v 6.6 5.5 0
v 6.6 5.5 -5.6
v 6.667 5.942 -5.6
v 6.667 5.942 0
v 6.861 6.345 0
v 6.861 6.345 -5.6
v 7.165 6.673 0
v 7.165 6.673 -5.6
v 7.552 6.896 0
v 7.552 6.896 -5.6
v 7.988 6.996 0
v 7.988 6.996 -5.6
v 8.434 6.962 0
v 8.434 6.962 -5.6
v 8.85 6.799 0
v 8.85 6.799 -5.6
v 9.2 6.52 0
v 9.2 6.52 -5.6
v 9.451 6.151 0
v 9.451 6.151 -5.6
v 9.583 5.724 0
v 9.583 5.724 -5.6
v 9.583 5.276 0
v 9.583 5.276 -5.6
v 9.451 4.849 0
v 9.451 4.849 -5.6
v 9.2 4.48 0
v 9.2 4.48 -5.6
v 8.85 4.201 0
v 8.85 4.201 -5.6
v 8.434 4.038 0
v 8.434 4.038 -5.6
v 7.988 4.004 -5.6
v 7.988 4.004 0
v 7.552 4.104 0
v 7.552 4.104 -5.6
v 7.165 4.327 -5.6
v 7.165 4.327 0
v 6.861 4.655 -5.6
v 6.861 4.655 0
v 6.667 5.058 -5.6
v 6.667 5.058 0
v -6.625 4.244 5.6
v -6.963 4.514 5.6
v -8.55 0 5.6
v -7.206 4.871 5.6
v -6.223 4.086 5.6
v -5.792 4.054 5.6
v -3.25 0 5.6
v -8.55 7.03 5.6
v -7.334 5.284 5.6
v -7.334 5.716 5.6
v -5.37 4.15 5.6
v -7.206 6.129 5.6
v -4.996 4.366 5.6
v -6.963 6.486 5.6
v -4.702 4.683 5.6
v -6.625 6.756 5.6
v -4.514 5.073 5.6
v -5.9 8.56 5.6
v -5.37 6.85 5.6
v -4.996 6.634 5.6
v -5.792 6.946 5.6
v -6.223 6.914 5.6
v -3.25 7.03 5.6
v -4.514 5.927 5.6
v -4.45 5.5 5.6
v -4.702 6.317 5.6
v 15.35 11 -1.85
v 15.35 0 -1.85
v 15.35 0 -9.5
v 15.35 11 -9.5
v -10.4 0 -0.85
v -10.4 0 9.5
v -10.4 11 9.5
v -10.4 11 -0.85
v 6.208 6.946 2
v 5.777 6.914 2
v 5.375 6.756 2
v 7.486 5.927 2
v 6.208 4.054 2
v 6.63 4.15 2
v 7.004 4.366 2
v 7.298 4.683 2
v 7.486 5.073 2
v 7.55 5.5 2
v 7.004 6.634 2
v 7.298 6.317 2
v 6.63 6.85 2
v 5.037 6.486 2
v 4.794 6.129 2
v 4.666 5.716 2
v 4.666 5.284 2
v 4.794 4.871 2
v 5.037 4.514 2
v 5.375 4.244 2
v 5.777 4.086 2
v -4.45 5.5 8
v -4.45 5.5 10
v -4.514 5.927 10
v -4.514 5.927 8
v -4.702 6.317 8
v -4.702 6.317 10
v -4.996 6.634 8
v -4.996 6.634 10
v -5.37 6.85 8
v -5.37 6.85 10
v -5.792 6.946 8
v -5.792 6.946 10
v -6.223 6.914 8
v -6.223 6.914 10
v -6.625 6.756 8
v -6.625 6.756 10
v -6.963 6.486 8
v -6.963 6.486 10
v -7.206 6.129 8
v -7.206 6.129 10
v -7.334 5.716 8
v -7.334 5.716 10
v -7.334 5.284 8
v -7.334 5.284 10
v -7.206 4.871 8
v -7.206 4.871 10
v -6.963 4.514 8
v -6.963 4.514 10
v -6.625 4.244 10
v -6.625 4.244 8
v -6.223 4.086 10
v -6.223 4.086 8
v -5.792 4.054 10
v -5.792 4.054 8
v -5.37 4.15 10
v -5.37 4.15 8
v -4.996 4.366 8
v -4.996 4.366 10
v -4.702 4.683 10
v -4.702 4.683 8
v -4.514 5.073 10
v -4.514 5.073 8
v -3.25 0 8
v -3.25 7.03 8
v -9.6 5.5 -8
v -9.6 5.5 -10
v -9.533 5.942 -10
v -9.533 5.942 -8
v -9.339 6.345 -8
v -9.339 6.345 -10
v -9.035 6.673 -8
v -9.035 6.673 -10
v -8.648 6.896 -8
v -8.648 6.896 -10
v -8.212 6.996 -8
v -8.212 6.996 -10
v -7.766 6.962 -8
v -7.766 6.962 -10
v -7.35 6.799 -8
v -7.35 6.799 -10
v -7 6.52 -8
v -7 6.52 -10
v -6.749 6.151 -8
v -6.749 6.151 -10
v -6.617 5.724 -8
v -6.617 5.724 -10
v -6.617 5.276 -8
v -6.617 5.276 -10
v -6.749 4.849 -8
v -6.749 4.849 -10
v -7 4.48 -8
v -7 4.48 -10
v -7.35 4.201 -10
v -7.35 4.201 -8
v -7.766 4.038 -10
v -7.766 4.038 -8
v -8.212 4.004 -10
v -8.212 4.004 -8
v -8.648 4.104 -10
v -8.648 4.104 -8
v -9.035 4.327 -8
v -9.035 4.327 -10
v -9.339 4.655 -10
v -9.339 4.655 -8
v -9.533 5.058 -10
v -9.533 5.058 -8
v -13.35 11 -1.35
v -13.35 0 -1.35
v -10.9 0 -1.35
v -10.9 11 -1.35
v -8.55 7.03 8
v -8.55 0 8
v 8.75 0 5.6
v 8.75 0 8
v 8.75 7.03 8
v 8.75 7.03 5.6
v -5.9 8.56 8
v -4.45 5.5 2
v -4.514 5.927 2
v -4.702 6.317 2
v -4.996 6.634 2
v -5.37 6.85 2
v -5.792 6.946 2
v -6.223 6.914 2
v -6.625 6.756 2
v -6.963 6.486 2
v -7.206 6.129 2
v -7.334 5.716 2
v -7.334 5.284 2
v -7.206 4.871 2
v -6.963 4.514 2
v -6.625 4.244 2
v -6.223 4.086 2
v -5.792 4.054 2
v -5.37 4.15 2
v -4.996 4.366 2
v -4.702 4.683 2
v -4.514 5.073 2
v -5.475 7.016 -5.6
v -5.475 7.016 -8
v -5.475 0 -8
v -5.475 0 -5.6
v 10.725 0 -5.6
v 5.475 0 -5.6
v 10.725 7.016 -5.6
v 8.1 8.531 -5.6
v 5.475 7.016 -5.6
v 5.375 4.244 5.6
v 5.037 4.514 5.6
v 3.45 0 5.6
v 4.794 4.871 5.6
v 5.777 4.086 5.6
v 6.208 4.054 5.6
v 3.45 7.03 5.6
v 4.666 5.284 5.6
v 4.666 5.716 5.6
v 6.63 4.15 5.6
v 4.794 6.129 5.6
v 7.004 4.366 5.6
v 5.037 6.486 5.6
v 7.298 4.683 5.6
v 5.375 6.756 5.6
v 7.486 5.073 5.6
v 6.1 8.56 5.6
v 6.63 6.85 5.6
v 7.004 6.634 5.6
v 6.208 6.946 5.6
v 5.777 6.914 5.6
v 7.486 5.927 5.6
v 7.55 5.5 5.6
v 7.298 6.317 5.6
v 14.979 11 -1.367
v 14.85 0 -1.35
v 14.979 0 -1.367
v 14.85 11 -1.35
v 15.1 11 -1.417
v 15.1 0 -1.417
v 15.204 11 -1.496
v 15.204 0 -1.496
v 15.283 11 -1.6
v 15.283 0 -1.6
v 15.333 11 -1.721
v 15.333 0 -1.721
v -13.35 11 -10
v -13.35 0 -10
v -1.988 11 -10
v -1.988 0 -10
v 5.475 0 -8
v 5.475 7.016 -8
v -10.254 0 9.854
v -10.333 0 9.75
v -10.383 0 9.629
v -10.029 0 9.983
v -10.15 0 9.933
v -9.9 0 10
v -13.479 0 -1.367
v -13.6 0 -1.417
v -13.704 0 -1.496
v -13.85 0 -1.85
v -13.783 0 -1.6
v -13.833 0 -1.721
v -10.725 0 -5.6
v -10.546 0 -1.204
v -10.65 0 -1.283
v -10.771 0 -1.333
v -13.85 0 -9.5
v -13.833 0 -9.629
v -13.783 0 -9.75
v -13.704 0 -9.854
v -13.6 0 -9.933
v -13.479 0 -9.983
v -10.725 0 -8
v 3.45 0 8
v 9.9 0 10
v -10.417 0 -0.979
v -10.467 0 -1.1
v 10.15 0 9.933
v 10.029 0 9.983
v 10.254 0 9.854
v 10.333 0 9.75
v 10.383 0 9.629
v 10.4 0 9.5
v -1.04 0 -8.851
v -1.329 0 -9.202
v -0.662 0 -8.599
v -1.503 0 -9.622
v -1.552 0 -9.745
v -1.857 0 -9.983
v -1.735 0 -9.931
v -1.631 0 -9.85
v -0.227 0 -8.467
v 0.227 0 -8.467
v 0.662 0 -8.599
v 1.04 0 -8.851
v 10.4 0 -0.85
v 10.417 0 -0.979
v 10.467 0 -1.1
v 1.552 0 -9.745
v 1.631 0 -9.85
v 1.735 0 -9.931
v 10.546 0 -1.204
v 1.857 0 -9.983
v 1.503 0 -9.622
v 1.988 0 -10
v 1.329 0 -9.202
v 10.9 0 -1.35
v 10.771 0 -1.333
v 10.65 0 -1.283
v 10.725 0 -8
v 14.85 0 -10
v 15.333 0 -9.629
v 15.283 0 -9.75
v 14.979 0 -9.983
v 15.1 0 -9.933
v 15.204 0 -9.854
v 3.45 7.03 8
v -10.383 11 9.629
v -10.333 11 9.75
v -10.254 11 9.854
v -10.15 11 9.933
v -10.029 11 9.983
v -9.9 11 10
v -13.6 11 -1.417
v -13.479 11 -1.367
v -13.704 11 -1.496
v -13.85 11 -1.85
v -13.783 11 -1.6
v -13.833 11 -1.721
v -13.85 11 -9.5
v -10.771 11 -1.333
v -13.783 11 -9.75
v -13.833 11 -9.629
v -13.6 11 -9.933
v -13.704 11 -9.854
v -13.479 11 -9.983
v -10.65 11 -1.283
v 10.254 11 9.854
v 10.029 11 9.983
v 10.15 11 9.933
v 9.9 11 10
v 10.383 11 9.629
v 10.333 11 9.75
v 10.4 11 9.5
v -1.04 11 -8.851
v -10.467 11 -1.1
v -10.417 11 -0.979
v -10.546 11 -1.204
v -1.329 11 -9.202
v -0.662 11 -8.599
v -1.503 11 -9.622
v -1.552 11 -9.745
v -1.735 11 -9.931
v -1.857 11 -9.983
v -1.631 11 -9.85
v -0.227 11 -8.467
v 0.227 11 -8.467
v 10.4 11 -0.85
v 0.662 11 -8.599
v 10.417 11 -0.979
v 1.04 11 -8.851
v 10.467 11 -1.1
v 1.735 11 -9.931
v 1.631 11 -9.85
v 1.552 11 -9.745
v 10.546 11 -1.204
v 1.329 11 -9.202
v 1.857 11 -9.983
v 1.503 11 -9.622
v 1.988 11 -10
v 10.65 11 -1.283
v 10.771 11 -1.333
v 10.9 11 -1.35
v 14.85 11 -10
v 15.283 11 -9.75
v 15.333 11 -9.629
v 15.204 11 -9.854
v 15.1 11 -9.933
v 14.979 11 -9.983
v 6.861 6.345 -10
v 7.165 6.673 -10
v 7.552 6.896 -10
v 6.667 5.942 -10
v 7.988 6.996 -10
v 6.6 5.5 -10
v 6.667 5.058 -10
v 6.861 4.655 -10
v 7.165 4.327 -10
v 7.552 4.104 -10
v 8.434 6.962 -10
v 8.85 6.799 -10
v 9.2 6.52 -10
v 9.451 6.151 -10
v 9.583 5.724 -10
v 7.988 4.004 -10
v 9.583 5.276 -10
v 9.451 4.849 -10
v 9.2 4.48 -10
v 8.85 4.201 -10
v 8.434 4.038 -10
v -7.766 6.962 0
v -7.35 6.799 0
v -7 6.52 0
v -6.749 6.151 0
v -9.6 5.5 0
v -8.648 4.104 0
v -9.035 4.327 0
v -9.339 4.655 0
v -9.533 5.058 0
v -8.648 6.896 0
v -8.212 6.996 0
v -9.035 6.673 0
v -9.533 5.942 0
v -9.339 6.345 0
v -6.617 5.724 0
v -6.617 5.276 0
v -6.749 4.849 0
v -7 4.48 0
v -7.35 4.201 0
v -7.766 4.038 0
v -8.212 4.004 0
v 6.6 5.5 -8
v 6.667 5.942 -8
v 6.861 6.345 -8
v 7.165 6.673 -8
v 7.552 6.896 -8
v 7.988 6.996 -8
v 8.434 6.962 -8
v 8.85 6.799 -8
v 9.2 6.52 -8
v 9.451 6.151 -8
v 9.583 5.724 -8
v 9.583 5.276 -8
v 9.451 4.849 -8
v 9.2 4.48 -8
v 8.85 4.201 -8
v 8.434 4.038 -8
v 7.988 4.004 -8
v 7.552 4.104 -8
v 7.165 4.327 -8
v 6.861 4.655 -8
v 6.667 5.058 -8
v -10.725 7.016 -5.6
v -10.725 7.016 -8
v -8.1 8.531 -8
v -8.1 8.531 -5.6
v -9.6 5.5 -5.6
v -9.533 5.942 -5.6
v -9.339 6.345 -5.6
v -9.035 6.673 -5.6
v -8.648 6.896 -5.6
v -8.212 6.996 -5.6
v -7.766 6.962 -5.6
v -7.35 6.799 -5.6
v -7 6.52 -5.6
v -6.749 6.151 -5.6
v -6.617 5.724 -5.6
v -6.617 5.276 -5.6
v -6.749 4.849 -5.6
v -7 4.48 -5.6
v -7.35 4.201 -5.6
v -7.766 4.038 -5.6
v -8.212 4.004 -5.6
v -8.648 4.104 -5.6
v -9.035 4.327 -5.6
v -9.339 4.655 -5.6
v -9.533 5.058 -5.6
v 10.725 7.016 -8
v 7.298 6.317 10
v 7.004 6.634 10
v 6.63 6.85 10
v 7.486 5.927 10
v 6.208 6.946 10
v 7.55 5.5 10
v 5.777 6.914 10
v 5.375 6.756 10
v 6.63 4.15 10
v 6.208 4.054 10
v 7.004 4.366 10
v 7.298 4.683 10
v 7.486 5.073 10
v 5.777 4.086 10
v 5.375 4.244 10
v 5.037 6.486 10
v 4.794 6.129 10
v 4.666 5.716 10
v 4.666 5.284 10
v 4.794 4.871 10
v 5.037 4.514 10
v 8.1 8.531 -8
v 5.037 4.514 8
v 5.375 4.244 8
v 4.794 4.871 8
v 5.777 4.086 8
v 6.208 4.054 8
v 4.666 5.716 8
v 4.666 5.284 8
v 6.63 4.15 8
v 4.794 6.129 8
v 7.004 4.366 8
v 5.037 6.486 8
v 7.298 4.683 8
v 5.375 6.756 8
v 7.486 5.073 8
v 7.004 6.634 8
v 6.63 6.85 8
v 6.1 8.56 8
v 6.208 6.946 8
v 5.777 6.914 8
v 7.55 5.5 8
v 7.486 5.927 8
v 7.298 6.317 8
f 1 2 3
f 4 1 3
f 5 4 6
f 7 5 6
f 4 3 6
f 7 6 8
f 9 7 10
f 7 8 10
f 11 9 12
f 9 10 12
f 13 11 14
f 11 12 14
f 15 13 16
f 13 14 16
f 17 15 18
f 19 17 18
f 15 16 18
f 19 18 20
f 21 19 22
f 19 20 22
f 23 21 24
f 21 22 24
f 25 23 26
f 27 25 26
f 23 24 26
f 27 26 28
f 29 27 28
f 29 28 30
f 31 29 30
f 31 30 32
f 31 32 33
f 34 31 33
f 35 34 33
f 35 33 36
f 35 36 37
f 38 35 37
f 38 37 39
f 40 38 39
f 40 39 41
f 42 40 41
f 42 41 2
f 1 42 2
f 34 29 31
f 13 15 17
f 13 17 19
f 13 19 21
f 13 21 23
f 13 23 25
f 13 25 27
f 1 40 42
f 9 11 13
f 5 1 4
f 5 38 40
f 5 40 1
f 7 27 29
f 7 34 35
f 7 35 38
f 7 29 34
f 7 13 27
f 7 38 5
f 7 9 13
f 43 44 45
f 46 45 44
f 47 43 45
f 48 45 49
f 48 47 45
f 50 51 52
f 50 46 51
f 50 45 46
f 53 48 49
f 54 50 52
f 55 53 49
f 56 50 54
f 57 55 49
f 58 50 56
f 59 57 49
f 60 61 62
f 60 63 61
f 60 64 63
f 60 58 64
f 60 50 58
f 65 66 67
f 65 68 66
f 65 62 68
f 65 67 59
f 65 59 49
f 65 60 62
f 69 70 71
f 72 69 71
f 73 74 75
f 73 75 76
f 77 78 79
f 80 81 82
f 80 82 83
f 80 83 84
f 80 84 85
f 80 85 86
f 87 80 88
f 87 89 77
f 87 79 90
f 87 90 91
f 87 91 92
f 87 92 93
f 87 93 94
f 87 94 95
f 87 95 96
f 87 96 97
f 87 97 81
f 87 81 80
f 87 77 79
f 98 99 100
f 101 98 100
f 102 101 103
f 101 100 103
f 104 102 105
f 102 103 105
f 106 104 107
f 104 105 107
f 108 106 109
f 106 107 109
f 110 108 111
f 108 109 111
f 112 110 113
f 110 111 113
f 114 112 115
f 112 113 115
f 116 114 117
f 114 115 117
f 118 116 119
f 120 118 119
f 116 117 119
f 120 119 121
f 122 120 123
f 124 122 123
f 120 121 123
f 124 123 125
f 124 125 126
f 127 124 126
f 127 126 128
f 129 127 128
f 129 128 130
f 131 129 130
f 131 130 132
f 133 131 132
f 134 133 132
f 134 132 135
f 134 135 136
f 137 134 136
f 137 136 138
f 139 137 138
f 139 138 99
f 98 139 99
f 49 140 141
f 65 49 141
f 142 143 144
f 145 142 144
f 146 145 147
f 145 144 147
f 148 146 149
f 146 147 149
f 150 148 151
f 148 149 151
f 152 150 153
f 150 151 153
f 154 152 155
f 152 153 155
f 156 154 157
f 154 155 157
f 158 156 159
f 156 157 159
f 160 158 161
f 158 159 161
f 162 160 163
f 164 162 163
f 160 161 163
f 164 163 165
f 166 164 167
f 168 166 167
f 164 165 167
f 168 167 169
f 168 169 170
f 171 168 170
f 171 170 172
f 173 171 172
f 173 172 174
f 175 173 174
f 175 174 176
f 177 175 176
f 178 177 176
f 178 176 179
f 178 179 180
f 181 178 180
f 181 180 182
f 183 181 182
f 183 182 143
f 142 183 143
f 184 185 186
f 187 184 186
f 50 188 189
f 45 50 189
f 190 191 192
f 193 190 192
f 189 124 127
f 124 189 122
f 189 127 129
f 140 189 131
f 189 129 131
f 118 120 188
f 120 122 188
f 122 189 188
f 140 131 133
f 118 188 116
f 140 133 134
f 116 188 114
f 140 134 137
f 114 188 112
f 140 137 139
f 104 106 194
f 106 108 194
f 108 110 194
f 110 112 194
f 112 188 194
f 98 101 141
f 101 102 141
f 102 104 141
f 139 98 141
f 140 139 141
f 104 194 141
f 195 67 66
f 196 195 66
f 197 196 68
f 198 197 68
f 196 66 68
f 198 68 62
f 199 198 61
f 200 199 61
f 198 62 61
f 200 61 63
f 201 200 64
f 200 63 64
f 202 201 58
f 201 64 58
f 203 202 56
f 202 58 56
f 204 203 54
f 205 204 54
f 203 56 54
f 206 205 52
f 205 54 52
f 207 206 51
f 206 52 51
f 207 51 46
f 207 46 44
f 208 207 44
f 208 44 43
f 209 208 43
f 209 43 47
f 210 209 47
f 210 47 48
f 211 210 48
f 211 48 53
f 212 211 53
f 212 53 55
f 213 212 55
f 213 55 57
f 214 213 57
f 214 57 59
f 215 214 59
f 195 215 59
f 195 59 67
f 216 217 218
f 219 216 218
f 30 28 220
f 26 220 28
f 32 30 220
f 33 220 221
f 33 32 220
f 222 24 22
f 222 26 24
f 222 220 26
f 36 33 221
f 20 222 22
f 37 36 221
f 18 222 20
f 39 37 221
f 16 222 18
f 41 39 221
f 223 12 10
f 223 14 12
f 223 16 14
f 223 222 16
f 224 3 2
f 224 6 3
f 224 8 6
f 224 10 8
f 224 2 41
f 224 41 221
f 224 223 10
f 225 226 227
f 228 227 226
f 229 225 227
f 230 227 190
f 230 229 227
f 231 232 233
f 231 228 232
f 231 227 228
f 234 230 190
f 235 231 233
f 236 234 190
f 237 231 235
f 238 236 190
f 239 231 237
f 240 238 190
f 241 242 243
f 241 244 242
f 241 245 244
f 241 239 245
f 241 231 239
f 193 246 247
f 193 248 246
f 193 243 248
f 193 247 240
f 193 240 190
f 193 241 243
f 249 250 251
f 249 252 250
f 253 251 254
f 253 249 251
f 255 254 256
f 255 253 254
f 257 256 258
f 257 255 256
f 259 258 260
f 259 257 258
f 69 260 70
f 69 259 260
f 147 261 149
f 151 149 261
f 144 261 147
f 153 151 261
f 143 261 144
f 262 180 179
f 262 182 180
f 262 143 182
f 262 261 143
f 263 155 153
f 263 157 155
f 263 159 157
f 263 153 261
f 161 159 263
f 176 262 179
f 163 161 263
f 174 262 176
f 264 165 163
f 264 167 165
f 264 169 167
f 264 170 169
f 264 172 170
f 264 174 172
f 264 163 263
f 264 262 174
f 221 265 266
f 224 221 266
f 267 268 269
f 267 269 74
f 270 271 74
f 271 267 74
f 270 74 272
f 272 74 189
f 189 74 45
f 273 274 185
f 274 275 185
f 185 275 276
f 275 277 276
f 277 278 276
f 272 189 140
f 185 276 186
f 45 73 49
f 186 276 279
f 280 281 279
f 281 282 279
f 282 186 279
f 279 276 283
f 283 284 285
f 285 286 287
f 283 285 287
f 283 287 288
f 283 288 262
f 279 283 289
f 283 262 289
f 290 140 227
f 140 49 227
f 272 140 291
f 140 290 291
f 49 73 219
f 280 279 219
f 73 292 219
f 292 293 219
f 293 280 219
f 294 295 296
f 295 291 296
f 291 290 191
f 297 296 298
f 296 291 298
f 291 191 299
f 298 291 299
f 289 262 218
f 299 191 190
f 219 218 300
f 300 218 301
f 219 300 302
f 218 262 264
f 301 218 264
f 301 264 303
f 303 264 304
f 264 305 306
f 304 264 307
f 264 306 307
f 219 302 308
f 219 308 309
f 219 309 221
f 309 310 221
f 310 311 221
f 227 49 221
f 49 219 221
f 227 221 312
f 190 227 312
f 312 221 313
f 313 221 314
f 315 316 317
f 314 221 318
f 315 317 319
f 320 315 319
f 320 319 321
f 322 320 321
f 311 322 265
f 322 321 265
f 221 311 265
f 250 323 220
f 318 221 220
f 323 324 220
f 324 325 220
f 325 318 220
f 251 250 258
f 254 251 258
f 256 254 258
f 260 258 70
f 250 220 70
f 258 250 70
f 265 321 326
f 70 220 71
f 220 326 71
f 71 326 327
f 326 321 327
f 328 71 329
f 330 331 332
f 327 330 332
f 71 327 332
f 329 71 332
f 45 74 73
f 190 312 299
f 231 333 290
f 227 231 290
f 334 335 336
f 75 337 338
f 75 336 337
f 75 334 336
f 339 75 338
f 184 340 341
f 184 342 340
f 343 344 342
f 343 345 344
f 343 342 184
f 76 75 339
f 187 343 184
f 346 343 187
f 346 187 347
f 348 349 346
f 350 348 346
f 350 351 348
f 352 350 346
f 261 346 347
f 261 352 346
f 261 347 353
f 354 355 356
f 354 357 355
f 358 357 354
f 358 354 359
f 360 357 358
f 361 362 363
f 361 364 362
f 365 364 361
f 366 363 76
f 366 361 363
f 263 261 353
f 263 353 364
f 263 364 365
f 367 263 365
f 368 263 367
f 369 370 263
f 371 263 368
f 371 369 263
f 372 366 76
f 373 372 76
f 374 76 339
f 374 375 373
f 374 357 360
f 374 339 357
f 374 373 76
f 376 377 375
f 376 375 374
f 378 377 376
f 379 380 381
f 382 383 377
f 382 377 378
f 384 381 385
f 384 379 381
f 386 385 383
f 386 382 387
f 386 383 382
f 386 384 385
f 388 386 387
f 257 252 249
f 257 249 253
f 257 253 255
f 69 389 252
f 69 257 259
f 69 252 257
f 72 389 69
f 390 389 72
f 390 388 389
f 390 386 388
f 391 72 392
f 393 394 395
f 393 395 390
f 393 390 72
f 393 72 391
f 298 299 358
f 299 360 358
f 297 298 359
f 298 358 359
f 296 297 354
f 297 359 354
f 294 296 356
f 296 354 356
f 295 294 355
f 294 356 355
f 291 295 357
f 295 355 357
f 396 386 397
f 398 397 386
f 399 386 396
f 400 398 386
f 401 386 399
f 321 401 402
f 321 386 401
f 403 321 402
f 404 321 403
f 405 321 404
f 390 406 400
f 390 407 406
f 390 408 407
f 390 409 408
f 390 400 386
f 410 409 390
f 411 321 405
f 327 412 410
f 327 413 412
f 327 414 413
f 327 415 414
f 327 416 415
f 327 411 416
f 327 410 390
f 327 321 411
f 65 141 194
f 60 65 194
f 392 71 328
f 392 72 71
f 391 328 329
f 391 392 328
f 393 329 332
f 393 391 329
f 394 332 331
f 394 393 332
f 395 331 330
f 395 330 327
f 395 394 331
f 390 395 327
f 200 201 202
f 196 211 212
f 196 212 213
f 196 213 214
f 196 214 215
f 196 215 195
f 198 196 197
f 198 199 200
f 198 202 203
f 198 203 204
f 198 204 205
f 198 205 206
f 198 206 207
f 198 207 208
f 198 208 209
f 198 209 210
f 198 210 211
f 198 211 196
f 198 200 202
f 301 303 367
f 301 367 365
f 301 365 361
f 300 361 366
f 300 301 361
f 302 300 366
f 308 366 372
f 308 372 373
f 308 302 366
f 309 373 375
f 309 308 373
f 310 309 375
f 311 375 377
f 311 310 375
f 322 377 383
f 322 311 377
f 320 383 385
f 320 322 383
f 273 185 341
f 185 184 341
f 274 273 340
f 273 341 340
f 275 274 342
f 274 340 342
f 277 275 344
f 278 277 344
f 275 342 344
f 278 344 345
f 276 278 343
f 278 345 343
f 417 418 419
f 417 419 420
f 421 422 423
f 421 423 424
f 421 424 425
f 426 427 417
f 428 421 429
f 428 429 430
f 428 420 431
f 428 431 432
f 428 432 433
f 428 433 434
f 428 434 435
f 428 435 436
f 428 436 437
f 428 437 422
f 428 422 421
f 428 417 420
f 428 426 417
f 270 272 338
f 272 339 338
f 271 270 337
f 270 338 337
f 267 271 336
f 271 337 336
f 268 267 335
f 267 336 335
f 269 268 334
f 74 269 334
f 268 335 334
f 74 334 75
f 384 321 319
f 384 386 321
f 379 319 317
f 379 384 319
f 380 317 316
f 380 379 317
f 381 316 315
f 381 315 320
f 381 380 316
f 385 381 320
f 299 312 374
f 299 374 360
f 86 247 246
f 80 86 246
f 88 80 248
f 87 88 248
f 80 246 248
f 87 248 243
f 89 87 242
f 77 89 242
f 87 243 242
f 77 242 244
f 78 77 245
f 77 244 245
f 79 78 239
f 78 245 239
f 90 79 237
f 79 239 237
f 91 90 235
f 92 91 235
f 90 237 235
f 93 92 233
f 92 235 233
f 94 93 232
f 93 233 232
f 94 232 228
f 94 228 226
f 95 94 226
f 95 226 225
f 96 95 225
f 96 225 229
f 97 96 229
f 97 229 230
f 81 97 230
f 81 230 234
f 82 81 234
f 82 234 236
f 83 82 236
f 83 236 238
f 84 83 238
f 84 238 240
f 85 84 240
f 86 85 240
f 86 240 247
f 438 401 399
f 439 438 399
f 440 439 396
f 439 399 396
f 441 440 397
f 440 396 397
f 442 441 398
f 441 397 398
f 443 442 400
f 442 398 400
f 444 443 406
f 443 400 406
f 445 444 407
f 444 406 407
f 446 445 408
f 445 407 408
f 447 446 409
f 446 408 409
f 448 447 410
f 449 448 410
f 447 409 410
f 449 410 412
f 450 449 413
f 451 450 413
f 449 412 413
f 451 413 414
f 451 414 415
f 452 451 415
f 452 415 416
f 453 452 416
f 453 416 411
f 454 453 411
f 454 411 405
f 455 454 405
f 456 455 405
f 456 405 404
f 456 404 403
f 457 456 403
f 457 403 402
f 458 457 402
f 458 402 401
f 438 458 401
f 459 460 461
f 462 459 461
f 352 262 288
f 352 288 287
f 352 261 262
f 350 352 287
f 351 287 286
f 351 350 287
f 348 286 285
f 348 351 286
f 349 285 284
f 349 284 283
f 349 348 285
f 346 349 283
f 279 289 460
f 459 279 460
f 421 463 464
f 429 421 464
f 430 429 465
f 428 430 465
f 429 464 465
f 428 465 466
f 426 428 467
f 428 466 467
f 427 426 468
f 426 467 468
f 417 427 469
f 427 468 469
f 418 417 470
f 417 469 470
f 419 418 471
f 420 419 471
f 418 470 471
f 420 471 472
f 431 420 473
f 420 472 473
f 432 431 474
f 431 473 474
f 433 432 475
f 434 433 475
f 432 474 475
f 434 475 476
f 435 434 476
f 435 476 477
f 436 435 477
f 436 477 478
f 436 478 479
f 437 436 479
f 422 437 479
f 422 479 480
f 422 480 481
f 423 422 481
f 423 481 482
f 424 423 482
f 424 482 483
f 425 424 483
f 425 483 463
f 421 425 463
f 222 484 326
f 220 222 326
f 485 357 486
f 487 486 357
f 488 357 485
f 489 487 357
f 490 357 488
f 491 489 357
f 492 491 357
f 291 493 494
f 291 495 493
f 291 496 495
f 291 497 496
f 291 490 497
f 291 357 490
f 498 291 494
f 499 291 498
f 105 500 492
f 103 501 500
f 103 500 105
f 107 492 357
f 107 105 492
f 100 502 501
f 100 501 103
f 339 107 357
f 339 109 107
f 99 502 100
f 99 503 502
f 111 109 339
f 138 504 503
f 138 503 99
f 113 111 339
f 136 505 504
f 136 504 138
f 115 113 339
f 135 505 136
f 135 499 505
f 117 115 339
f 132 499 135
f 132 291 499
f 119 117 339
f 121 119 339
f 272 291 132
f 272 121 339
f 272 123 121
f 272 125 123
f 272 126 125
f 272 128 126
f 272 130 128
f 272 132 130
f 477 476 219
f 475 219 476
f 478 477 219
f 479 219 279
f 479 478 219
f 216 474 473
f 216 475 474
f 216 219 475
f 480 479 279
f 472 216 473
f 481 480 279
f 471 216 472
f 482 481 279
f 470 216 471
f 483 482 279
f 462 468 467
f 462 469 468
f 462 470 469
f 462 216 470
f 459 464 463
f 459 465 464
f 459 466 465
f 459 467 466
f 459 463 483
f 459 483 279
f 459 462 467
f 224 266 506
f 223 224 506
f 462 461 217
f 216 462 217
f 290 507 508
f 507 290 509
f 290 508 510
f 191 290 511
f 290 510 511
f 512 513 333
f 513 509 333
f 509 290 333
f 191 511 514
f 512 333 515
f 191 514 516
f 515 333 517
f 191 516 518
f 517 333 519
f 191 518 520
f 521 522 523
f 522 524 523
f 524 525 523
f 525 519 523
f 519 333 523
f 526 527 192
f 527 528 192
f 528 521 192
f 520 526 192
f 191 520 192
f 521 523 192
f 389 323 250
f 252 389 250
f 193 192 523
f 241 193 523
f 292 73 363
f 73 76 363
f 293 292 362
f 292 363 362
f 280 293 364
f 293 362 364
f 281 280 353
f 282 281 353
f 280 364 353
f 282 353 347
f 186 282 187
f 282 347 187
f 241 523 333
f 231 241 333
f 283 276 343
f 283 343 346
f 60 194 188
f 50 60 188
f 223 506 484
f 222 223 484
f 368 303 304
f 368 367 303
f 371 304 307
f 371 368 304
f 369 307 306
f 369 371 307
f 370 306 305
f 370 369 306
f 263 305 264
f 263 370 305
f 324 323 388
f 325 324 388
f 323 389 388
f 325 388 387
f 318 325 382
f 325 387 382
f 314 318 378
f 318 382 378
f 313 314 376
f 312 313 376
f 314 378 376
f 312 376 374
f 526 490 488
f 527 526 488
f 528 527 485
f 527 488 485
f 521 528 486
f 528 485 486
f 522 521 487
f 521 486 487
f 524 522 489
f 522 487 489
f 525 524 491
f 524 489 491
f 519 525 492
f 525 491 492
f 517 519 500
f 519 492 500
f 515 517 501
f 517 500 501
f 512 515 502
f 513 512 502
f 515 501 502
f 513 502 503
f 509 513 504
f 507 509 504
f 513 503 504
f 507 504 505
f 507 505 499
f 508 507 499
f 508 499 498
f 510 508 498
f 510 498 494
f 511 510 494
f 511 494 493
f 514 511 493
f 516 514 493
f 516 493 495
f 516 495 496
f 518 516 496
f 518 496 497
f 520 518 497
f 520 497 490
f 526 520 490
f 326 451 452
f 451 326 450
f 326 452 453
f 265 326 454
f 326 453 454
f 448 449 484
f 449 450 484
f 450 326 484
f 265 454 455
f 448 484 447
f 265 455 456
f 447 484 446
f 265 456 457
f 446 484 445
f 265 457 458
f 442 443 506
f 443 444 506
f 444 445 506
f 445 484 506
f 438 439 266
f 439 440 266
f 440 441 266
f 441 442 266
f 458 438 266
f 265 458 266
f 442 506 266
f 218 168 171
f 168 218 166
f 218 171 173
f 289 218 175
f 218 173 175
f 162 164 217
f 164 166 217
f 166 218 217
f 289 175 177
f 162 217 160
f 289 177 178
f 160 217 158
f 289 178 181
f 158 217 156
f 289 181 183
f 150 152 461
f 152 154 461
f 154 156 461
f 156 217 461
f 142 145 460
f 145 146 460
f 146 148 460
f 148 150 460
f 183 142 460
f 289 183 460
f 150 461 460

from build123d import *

# Parameters (mm, degrees)
BOSS_EXTRUDE1_DEPTH = 11
SKETCH2_R           = 1.45
CUT_EXTRUDE1_DEPTH  = 8
SKETCH3_R           = 1.5
CUT_EXTRUDE2_DEPTH  = 10
CUT_EXTRUDE4_START  = -2
CUT_EXTRUDE4_DEPTH  = 2.4
SKETCH1_4_W         = 4.95
SKETCH1_4_H         = 8.65
SKETCH1_4_W_2       = 3.45
BOSS_EXTRUDE2_DEPTH = 11
CUT_EXTRUDE3_START  = -2
SKETCH5_R           = 1.5
CUT_EXTRUDE3_DEPTH  = 2.4
FILLET2_R           = 0.5


with BuildPart() as part:
    # Sketch1 → Boss-Extrude1 (new body)
    with BuildSketch(Plane(origin=(0, 0, 0), x_dir=(1, 0, 0), z_dir=(0, 1, 0))):
        with BuildLine():
            ThreePointArc((-1.55, 10), (0, 8.45), (1.55, 10))
            Line((1.55, 10), (10.4, 10))
            Line((10.4, 10), (10.4, -10))
            Line((10.4, -10), (-10.4, -10))
            Line((-10.4, -10), (-10.4, 10))
            Line((-10.4, 10), (-1.55, 10))
        make_face()
    extrude(amount=BOSS_EXTRUDE1_DEPTH)

    # Sketch2 → Cut-Extrude1 (cut)
    with BuildSketch(Plane.XY.offset(10)):
        with Locations((-5.9, 5.5)):
            Circle(SKETCH2_R)
        with Locations((6.1, 5.5)):
            Circle(SKETCH2_R)
    extrude(amount=-CUT_EXTRUDE1_DEPTH, mode=Mode.SUBTRACT)

    # Sketch3 → Cut-Extrude2 (cut)
    with BuildSketch(Plane(origin=(0, 0, -10), x_dir=(-1, 0, 0), z_dir=(0, 0, -1))):
        with Locations((-8.1, 5.5)):
            Circle(SKETCH3_R)
        with Locations((8.1, 5.5)):
            Circle(SKETCH3_R)
    extrude(amount=-CUT_EXTRUDE2_DEPTH, mode=Mode.SUBTRACT)

    # Sketch6 → Cut-Extrude4 (cut)
    with BuildSketch(Plane.XY.offset(10).offset(CUT_EXTRUDE4_START)):
        Polygon((-5.9, 8.559956427), (-8.55, 7.029978213), (-8.55, 3.970021787), (-8.55, 0), (-3.25, 0), (-3.25, 3.970021787), (-3.25, 7.029978213), align=None)
        Polygon((6.1, 8.559956427), (3.45, 7.029978213), (3.45, 3.970021787), (3.45, 0), (8.75, 0), (8.75, 3.970021787), (8.75, 7.029978213), align=None)
    extrude(amount=-CUT_EXTRUDE4_DEPTH, mode=Mode.SUBTRACT)

    # Sketch1<4> → Boss-Extrude2 (add, through all)
    with BuildSketch(Plane(origin=(0, 0, 0), x_dir=(1, 0, 0), z_dir=(0, 1, 0))):
        with Locations((12.875, 5.675)):
            Rectangle(SKETCH1_4_W, SKETCH1_4_H)
        with Locations((-12.125, 5.675)):
            Rectangle(SKETCH1_4_W_2, SKETCH1_4_H)
    extrude(amount=BOSS_EXTRUDE2_DEPTH)

    # Sketch5 → Cut-Extrude3 (cut)
    # profile 1 of 2: a face of its own
    with BuildSketch(Plane(origin=(0, 0, -10), x_dir=(-1, 0, 0), z_dir=(0, 0, -1)).offset(CUT_EXTRUDE3_START)):
        Polygon((-5.475, 0), (-5.475, 3.984455543), (-5.475, 7.015544457), (-8.1, 8.531088913), (-10.725, 7.015544457), (-10.725, 3.984455543), (-10.725, 0), align=None)
        with Locations((-8.1, 5.5)):
            Circle(SKETCH5_R, mode=Mode.SUBTRACT)
    # profile 2 of 2: a face of its own
    with BuildSketch(Plane(origin=(0, 0, -10), x_dir=(-1, 0, 0), z_dir=(0, 0, -1)).offset(CUT_EXTRUDE3_START)):
        Polygon((5.475, 0), (10.725, 0), (10.725, 3.984455543), (10.725, 7.015544457), (8.1, 8.531088913), (5.475, 7.015544457), (5.475, 3.984455543), align=None)
    extrude(amount=-CUT_EXTRUDE3_DEPTH, mode=Mode.SUBTRACT)

    # Fillet2
    fillet2_edges = [part.edges().sort_by_distance(p)[0] for p in [
        (1.55, 5.5, -10),
        (10.4, 5.5, 10),
        (-10.4, 5.5, 10),
        (-1.55, 5.5, -10),
        (10.4, 5.5, -1.35),
        (15.35, 5.5, -1.35),
        (15.35, 5.5, -10),
        (-13.85, 5.5, -10),
        (-13.85, 5.5, -1.35),
        (-10.4, 5.5, -1.35),
    ]]
    fillet(fillet2_edges, radius=FILLET2_R)


solid = part.part
